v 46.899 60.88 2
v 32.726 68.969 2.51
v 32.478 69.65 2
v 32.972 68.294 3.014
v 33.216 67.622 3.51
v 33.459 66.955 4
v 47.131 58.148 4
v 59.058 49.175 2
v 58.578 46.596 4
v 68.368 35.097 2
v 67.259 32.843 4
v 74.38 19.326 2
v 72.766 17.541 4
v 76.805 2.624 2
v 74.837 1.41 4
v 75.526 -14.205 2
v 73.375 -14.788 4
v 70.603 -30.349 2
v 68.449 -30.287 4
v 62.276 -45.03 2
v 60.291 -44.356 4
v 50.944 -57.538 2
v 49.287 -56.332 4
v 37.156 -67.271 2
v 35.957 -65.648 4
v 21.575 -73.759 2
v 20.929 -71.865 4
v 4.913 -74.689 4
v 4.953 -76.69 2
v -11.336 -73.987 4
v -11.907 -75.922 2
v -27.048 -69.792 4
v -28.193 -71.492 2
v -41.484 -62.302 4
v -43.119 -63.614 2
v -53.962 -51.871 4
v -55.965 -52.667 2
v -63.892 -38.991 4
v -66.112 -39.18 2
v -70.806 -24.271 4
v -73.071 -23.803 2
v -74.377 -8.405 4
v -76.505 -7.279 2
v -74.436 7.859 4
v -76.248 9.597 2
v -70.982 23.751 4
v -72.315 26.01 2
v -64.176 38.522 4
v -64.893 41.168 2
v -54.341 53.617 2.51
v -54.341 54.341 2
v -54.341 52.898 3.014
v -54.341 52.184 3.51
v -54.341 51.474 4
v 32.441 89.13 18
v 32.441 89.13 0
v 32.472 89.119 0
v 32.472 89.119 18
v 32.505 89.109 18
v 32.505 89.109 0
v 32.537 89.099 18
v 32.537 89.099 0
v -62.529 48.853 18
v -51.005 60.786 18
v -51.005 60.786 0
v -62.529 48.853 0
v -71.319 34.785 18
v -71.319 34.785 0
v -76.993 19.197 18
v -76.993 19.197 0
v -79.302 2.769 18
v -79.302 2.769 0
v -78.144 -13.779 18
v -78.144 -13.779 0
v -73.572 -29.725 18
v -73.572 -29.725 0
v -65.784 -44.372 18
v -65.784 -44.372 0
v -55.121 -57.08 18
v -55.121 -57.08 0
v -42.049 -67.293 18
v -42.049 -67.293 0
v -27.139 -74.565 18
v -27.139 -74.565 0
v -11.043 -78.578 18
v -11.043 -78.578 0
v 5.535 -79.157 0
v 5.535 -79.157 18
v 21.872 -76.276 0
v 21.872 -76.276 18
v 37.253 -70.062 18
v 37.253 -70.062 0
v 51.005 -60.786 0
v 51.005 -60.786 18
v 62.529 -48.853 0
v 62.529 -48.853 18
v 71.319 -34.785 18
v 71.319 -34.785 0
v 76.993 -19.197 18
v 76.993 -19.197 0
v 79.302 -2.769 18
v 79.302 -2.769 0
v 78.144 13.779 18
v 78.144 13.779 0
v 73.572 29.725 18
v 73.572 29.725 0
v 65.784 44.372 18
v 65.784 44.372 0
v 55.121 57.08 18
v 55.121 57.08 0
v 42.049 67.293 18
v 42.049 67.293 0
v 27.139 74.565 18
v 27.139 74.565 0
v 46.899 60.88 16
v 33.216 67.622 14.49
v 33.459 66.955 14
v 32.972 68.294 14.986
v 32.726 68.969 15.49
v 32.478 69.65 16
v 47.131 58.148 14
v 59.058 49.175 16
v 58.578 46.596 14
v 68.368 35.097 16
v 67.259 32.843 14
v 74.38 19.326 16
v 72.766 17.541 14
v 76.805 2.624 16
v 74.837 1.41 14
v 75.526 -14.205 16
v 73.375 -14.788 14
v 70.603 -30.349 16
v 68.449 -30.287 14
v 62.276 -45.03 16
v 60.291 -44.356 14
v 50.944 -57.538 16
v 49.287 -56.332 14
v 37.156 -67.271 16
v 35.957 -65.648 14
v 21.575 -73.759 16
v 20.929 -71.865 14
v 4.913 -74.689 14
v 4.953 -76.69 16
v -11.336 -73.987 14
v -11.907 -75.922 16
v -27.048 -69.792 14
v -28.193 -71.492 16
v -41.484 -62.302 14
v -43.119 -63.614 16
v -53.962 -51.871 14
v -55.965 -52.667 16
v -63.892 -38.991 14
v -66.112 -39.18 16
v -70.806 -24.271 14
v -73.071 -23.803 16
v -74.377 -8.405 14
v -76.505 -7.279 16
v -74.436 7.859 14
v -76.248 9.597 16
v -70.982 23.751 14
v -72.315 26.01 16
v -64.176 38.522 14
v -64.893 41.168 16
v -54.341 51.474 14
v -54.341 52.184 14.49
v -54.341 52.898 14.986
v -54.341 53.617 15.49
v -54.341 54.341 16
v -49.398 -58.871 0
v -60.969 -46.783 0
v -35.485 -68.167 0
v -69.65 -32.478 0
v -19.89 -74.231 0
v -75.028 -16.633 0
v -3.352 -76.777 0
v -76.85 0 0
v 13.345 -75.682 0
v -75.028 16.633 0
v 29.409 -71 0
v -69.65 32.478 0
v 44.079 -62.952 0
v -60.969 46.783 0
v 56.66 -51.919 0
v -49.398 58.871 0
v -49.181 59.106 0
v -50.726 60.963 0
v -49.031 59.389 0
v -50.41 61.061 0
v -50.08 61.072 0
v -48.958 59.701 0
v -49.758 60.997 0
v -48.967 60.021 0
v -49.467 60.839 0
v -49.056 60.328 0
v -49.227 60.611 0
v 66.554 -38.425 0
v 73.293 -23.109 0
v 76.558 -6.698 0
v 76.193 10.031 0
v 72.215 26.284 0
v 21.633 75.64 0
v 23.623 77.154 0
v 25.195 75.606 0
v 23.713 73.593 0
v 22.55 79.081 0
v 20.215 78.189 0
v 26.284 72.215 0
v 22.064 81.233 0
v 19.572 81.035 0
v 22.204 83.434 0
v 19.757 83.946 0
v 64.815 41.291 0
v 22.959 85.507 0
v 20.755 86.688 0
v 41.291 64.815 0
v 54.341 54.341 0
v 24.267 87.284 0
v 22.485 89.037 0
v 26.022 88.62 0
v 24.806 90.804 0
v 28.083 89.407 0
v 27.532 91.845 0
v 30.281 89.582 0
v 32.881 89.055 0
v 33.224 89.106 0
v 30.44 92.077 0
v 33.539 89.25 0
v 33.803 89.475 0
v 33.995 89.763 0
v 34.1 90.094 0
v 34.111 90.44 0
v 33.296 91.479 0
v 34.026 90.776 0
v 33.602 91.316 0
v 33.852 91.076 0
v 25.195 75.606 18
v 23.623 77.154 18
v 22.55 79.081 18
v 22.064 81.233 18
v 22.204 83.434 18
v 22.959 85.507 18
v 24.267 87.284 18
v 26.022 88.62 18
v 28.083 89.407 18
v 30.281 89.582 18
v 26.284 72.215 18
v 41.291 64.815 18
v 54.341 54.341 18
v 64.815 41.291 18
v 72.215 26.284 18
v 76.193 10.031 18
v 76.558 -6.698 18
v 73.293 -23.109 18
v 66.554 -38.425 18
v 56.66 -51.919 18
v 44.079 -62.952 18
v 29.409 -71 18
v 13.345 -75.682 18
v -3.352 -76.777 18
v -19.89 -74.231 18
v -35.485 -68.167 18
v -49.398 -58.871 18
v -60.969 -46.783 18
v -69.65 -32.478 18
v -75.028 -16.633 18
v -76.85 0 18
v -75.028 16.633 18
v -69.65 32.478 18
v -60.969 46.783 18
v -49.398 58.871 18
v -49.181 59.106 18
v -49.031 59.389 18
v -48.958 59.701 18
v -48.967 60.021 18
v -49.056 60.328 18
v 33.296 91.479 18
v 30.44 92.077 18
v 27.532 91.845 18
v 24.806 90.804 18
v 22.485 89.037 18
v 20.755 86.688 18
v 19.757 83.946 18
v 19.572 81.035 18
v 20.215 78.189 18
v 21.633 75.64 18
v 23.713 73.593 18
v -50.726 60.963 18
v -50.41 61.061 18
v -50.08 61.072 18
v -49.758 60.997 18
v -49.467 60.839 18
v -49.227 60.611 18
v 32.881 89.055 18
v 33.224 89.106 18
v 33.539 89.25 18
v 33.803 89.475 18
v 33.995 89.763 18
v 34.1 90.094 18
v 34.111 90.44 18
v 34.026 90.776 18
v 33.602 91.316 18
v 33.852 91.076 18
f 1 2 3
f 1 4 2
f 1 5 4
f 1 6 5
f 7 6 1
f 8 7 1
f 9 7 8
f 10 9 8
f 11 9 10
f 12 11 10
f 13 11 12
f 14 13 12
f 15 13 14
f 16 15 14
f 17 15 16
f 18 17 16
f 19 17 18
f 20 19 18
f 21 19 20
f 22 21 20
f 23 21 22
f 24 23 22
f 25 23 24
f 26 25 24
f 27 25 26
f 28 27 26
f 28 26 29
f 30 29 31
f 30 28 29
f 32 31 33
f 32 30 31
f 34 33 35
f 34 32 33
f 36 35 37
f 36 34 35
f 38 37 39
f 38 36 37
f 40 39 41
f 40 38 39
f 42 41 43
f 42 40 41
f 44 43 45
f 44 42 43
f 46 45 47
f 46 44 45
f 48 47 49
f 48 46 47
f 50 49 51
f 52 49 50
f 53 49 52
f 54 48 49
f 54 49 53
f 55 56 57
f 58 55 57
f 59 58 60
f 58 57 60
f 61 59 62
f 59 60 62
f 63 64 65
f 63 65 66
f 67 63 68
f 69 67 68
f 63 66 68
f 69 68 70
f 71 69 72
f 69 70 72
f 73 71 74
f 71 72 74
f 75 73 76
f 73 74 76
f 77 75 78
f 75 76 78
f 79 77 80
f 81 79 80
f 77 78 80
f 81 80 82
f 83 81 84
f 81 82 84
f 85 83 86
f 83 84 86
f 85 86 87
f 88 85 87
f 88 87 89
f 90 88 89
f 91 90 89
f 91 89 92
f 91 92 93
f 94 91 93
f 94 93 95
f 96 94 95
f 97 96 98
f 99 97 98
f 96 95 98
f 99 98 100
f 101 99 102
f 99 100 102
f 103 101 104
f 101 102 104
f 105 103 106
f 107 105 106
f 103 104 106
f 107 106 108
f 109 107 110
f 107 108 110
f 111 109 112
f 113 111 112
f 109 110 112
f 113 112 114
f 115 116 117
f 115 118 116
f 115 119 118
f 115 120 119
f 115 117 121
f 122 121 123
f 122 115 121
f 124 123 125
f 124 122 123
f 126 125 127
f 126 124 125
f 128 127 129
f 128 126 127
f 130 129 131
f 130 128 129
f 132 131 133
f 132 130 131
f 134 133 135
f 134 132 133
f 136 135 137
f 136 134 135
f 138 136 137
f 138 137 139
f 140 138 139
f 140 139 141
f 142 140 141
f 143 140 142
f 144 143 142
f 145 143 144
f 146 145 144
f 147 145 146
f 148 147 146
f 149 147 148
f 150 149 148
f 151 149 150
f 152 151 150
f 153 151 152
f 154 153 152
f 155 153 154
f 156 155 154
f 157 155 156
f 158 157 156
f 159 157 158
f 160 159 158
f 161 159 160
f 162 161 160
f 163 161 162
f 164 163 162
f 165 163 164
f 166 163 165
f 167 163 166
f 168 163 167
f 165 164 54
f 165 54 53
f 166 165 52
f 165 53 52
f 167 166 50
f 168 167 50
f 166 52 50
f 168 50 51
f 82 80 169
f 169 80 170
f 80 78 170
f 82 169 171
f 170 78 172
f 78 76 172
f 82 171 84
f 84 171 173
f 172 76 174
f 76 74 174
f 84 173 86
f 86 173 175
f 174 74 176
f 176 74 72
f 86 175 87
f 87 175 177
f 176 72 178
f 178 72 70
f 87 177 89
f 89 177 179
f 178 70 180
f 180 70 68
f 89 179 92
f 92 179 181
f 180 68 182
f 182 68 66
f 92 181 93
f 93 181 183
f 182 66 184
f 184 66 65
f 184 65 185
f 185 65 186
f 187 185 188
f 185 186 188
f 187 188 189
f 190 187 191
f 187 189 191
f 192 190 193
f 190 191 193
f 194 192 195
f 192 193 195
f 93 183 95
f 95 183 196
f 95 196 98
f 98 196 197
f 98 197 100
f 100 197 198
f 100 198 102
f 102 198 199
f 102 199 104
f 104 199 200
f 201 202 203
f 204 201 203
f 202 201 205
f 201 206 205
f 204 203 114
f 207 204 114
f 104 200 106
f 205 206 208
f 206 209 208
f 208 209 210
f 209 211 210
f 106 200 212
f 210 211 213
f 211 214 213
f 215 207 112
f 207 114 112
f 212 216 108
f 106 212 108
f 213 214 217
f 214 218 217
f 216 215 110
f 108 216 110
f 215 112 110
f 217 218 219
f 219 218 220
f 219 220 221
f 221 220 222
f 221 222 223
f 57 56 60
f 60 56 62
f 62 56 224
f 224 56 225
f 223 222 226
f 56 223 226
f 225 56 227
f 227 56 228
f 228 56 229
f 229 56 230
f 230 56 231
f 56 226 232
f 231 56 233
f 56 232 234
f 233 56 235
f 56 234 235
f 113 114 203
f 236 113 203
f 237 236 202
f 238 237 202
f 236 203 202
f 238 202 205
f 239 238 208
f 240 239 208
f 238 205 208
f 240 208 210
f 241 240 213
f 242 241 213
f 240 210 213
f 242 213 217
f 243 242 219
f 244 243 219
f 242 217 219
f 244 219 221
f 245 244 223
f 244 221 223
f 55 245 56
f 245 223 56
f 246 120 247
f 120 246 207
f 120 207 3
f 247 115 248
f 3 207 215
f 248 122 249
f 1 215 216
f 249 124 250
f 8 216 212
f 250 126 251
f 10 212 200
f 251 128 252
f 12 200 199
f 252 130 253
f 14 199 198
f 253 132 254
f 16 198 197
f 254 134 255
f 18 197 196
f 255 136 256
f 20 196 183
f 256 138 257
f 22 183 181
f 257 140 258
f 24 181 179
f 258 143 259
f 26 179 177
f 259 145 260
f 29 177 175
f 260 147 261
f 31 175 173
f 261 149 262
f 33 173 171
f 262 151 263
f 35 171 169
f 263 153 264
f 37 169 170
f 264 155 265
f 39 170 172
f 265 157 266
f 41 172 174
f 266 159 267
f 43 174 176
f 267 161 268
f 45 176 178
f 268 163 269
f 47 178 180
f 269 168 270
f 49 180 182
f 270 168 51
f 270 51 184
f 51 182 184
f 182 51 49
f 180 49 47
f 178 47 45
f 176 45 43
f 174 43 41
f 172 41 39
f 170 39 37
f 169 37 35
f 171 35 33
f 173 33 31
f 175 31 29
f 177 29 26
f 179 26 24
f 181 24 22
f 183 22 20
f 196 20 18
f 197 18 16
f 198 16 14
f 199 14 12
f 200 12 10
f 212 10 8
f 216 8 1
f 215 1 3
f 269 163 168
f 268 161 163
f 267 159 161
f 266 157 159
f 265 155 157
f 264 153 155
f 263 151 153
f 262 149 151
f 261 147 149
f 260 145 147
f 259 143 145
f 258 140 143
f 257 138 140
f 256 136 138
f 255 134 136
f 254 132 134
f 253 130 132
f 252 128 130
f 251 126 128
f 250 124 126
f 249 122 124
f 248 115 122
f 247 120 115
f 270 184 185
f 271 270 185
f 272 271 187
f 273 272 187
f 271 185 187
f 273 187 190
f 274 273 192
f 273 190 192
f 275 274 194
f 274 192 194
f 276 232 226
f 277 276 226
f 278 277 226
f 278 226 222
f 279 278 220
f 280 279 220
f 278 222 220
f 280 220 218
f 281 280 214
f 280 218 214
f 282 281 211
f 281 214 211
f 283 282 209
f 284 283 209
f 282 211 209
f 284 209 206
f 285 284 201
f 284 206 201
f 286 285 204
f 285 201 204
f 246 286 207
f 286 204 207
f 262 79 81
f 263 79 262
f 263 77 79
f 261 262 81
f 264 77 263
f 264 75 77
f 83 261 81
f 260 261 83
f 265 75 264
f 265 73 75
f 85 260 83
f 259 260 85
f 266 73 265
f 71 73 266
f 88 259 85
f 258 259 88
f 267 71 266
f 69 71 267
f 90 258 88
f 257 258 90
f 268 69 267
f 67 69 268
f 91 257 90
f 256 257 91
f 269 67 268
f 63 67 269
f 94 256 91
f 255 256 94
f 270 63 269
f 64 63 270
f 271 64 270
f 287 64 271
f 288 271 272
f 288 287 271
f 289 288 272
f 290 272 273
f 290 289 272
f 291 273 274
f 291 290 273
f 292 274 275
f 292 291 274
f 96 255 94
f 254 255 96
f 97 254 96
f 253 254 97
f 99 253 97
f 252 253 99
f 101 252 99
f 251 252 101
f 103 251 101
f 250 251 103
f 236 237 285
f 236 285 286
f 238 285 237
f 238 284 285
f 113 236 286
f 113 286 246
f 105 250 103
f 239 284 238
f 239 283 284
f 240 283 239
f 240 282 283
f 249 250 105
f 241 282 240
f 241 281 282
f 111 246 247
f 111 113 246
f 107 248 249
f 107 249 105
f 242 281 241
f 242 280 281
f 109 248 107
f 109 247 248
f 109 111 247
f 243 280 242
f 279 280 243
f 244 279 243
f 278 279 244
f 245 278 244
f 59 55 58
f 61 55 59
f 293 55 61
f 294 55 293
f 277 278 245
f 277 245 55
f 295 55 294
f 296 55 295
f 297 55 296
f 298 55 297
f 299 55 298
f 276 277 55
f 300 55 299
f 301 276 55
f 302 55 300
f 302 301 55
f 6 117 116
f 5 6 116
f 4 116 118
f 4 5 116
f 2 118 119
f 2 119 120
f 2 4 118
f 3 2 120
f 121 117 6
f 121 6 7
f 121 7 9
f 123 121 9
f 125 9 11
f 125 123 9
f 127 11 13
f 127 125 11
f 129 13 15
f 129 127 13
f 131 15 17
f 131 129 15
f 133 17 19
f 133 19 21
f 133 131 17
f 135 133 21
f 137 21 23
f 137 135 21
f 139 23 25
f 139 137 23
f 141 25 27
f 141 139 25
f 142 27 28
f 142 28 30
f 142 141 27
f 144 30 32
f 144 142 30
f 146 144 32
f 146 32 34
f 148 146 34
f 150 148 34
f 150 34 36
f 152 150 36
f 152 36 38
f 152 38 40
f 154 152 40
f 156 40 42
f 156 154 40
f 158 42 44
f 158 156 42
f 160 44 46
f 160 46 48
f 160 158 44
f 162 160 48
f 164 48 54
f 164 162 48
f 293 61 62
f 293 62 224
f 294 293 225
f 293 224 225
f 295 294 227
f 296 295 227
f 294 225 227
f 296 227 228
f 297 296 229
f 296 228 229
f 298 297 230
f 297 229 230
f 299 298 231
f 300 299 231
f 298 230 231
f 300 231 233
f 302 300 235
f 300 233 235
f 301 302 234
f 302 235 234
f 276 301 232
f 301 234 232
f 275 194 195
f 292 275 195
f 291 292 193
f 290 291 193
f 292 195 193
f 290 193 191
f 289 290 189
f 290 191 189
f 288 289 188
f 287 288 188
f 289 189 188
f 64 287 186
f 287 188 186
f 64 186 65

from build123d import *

# Parameters (mm, degrees)
BOSS_EXTRUDE1_DEPTH      = 18
REVOLVE1_ANGLE           = 155
REVOLVE1_OTHER_WAY_ANGLE = 135
CHAMFER1_SIZE            = 2


with BuildPart() as part:
    # Sketch1 → Boss-Extrude1 (new body)
    with BuildSketch(Plane.XY):
        with BuildLine():
            ThreePointArc((26.284248015, 72.215377907), (13.344862454, -75.682475819), (-49.398227804, 58.870515454))
            ThreePointArc((-49.398227804, 58.870515454), (-48.984779038, 59.542460442), (-49.056117508, 60.328183531))
            ThreePointArc((-49.056117508, 60.328183531), (-49.916101751, 61.045004286), (-51.005196829, 60.785626561))
            ThreePointArc((-51.005196829, 60.785626561), (13.778982898, -78.144495202), (27.139298373, 74.564609459))
            ThreePointArc((27.139298373, 74.564609459), (22.507336673, 84.497883381), (32.440610594, 89.129845082))
            ThreePointArc((32.440610594, 89.129845082), (32.488426827, 89.113527981), (32.536863386, 89.099156495))
            ThreePointArc((32.536863386, 89.099156495), (34.05906865, 89.924751911), (33.295660953, 91.479076634))
            ThreePointArc((33.295660953, 91.479076634), (20.158105121, 85.35293374), (26.284248015, 72.215377907))
        make_face()
    extrude(amount=BOSS_EXTRUDE1_DEPTH)

    # Sketch2 → Revolve1 (revolve)
    with BuildSketch(Plane(origin=(0, 0, 0), x_dir=(0, 0, -1), z_dir=(1, 0, 0))):
        Polygon((-14, -74.85), (-16, -76.85), (-2, -76.85), (-4, -74.85), align=None)
    revolve(axis=Axis((0, 0, 0), (0, 0, 1)), revolution_arc=REVOLVE1_ANGLE)

    # Sketch2 → Revolve1 other way (revolve)
    with BuildSketch(Plane(origin=(0, 0, 0), x_dir=(0, 0, -1), z_dir=(1, 0, 0))):
        Polygon((-14, -74.85), (-16, -76.85), (-2, -76.85), (-4, -74.85), align=None)
    revolve(axis=Axis((0, 0, 0), (0, 0, -1)), revolution_arc=REVOLVE1_OTHER_WAY_ANGLE)

    # Chamfer1
    # the kernel refuses this chamfer: 2 mm, written as the material it takes off along each edge
    with BuildSketch(Plane(origin=(31.632976891, 67.83713786, -1.214315162), x_dir=(0.9005003860175051, -0.4348552112856927, 0), z_dir=(0, 0, 1))) as chamfer1_piece_1_section:
        with BuildLine():
            Line((2.027650031, 0), (-CHAMFER1_SIZE * 0.0135447563861, CHAMFER1_SIZE * 0.99990826558))
            Line((-CHAMFER1_SIZE * 0.0135447563861, CHAMFER1_SIZE * 0.99990826558), (0, 0))
            ThreePointArc((0, 0), (1.042503113, 0.006860827), (2.027650031, 0))
        make_face()
    chamfer1_piece_1 = extrude(amount=20.428630325, mode=Mode.PRIVATE)
    chamfer1_piece_1 = chamfer1_piece_1 & Plane(origin=(0, 0, -1.214315162), x_dir=(0.3420201433256637, 0.9396926207859103, 0), z_dir=(0, 0, -1)) * Cylinder(76.85, 49, mode=Mode.PRIVATE)
    add(chamfer1_piece_1, mode=Mode.SUBTRACT)
    with BuildSketch(Plane(origin=(-52.926942572, 52.926942572, -1.214315162), x_dir=(-0.6974643260656699, -0.7166195042459848, 0), z_dir=(0, 0, 1))) as chamfer1_piece_2_section:
        with BuildLine():
            Line((2.027650031, 0), (-CHAMFER1_SIZE * 0.0135447563861, -CHAMFER1_SIZE * 0.99990826558))
            Line((-CHAMFER1_SIZE * 0.0135447563861, -CHAMFER1_SIZE * 0.99990826558), (0, 0))
            ThreePointArc((0, 0), (1.042503113, -0.006860827), (2.027650031, 0))
        make_face()
    chamfer1_piece_2 = extrude(amount=20.428630325, mode=Mode.PRIVATE)
    chamfer1_piece_2 = chamfer1_piece_2 & Plane(origin=(0, 0, -1.214315162), x_dir=(0.3420201433256637, 0.9396926207859103, 0), z_dir=(0, 0, -1)) * Cylinder(76.85, 49, mode=Mode.PRIVATE)
    add(chamfer1_piece_2, mode=Mode.SUBTRACT)


solid = part.part
